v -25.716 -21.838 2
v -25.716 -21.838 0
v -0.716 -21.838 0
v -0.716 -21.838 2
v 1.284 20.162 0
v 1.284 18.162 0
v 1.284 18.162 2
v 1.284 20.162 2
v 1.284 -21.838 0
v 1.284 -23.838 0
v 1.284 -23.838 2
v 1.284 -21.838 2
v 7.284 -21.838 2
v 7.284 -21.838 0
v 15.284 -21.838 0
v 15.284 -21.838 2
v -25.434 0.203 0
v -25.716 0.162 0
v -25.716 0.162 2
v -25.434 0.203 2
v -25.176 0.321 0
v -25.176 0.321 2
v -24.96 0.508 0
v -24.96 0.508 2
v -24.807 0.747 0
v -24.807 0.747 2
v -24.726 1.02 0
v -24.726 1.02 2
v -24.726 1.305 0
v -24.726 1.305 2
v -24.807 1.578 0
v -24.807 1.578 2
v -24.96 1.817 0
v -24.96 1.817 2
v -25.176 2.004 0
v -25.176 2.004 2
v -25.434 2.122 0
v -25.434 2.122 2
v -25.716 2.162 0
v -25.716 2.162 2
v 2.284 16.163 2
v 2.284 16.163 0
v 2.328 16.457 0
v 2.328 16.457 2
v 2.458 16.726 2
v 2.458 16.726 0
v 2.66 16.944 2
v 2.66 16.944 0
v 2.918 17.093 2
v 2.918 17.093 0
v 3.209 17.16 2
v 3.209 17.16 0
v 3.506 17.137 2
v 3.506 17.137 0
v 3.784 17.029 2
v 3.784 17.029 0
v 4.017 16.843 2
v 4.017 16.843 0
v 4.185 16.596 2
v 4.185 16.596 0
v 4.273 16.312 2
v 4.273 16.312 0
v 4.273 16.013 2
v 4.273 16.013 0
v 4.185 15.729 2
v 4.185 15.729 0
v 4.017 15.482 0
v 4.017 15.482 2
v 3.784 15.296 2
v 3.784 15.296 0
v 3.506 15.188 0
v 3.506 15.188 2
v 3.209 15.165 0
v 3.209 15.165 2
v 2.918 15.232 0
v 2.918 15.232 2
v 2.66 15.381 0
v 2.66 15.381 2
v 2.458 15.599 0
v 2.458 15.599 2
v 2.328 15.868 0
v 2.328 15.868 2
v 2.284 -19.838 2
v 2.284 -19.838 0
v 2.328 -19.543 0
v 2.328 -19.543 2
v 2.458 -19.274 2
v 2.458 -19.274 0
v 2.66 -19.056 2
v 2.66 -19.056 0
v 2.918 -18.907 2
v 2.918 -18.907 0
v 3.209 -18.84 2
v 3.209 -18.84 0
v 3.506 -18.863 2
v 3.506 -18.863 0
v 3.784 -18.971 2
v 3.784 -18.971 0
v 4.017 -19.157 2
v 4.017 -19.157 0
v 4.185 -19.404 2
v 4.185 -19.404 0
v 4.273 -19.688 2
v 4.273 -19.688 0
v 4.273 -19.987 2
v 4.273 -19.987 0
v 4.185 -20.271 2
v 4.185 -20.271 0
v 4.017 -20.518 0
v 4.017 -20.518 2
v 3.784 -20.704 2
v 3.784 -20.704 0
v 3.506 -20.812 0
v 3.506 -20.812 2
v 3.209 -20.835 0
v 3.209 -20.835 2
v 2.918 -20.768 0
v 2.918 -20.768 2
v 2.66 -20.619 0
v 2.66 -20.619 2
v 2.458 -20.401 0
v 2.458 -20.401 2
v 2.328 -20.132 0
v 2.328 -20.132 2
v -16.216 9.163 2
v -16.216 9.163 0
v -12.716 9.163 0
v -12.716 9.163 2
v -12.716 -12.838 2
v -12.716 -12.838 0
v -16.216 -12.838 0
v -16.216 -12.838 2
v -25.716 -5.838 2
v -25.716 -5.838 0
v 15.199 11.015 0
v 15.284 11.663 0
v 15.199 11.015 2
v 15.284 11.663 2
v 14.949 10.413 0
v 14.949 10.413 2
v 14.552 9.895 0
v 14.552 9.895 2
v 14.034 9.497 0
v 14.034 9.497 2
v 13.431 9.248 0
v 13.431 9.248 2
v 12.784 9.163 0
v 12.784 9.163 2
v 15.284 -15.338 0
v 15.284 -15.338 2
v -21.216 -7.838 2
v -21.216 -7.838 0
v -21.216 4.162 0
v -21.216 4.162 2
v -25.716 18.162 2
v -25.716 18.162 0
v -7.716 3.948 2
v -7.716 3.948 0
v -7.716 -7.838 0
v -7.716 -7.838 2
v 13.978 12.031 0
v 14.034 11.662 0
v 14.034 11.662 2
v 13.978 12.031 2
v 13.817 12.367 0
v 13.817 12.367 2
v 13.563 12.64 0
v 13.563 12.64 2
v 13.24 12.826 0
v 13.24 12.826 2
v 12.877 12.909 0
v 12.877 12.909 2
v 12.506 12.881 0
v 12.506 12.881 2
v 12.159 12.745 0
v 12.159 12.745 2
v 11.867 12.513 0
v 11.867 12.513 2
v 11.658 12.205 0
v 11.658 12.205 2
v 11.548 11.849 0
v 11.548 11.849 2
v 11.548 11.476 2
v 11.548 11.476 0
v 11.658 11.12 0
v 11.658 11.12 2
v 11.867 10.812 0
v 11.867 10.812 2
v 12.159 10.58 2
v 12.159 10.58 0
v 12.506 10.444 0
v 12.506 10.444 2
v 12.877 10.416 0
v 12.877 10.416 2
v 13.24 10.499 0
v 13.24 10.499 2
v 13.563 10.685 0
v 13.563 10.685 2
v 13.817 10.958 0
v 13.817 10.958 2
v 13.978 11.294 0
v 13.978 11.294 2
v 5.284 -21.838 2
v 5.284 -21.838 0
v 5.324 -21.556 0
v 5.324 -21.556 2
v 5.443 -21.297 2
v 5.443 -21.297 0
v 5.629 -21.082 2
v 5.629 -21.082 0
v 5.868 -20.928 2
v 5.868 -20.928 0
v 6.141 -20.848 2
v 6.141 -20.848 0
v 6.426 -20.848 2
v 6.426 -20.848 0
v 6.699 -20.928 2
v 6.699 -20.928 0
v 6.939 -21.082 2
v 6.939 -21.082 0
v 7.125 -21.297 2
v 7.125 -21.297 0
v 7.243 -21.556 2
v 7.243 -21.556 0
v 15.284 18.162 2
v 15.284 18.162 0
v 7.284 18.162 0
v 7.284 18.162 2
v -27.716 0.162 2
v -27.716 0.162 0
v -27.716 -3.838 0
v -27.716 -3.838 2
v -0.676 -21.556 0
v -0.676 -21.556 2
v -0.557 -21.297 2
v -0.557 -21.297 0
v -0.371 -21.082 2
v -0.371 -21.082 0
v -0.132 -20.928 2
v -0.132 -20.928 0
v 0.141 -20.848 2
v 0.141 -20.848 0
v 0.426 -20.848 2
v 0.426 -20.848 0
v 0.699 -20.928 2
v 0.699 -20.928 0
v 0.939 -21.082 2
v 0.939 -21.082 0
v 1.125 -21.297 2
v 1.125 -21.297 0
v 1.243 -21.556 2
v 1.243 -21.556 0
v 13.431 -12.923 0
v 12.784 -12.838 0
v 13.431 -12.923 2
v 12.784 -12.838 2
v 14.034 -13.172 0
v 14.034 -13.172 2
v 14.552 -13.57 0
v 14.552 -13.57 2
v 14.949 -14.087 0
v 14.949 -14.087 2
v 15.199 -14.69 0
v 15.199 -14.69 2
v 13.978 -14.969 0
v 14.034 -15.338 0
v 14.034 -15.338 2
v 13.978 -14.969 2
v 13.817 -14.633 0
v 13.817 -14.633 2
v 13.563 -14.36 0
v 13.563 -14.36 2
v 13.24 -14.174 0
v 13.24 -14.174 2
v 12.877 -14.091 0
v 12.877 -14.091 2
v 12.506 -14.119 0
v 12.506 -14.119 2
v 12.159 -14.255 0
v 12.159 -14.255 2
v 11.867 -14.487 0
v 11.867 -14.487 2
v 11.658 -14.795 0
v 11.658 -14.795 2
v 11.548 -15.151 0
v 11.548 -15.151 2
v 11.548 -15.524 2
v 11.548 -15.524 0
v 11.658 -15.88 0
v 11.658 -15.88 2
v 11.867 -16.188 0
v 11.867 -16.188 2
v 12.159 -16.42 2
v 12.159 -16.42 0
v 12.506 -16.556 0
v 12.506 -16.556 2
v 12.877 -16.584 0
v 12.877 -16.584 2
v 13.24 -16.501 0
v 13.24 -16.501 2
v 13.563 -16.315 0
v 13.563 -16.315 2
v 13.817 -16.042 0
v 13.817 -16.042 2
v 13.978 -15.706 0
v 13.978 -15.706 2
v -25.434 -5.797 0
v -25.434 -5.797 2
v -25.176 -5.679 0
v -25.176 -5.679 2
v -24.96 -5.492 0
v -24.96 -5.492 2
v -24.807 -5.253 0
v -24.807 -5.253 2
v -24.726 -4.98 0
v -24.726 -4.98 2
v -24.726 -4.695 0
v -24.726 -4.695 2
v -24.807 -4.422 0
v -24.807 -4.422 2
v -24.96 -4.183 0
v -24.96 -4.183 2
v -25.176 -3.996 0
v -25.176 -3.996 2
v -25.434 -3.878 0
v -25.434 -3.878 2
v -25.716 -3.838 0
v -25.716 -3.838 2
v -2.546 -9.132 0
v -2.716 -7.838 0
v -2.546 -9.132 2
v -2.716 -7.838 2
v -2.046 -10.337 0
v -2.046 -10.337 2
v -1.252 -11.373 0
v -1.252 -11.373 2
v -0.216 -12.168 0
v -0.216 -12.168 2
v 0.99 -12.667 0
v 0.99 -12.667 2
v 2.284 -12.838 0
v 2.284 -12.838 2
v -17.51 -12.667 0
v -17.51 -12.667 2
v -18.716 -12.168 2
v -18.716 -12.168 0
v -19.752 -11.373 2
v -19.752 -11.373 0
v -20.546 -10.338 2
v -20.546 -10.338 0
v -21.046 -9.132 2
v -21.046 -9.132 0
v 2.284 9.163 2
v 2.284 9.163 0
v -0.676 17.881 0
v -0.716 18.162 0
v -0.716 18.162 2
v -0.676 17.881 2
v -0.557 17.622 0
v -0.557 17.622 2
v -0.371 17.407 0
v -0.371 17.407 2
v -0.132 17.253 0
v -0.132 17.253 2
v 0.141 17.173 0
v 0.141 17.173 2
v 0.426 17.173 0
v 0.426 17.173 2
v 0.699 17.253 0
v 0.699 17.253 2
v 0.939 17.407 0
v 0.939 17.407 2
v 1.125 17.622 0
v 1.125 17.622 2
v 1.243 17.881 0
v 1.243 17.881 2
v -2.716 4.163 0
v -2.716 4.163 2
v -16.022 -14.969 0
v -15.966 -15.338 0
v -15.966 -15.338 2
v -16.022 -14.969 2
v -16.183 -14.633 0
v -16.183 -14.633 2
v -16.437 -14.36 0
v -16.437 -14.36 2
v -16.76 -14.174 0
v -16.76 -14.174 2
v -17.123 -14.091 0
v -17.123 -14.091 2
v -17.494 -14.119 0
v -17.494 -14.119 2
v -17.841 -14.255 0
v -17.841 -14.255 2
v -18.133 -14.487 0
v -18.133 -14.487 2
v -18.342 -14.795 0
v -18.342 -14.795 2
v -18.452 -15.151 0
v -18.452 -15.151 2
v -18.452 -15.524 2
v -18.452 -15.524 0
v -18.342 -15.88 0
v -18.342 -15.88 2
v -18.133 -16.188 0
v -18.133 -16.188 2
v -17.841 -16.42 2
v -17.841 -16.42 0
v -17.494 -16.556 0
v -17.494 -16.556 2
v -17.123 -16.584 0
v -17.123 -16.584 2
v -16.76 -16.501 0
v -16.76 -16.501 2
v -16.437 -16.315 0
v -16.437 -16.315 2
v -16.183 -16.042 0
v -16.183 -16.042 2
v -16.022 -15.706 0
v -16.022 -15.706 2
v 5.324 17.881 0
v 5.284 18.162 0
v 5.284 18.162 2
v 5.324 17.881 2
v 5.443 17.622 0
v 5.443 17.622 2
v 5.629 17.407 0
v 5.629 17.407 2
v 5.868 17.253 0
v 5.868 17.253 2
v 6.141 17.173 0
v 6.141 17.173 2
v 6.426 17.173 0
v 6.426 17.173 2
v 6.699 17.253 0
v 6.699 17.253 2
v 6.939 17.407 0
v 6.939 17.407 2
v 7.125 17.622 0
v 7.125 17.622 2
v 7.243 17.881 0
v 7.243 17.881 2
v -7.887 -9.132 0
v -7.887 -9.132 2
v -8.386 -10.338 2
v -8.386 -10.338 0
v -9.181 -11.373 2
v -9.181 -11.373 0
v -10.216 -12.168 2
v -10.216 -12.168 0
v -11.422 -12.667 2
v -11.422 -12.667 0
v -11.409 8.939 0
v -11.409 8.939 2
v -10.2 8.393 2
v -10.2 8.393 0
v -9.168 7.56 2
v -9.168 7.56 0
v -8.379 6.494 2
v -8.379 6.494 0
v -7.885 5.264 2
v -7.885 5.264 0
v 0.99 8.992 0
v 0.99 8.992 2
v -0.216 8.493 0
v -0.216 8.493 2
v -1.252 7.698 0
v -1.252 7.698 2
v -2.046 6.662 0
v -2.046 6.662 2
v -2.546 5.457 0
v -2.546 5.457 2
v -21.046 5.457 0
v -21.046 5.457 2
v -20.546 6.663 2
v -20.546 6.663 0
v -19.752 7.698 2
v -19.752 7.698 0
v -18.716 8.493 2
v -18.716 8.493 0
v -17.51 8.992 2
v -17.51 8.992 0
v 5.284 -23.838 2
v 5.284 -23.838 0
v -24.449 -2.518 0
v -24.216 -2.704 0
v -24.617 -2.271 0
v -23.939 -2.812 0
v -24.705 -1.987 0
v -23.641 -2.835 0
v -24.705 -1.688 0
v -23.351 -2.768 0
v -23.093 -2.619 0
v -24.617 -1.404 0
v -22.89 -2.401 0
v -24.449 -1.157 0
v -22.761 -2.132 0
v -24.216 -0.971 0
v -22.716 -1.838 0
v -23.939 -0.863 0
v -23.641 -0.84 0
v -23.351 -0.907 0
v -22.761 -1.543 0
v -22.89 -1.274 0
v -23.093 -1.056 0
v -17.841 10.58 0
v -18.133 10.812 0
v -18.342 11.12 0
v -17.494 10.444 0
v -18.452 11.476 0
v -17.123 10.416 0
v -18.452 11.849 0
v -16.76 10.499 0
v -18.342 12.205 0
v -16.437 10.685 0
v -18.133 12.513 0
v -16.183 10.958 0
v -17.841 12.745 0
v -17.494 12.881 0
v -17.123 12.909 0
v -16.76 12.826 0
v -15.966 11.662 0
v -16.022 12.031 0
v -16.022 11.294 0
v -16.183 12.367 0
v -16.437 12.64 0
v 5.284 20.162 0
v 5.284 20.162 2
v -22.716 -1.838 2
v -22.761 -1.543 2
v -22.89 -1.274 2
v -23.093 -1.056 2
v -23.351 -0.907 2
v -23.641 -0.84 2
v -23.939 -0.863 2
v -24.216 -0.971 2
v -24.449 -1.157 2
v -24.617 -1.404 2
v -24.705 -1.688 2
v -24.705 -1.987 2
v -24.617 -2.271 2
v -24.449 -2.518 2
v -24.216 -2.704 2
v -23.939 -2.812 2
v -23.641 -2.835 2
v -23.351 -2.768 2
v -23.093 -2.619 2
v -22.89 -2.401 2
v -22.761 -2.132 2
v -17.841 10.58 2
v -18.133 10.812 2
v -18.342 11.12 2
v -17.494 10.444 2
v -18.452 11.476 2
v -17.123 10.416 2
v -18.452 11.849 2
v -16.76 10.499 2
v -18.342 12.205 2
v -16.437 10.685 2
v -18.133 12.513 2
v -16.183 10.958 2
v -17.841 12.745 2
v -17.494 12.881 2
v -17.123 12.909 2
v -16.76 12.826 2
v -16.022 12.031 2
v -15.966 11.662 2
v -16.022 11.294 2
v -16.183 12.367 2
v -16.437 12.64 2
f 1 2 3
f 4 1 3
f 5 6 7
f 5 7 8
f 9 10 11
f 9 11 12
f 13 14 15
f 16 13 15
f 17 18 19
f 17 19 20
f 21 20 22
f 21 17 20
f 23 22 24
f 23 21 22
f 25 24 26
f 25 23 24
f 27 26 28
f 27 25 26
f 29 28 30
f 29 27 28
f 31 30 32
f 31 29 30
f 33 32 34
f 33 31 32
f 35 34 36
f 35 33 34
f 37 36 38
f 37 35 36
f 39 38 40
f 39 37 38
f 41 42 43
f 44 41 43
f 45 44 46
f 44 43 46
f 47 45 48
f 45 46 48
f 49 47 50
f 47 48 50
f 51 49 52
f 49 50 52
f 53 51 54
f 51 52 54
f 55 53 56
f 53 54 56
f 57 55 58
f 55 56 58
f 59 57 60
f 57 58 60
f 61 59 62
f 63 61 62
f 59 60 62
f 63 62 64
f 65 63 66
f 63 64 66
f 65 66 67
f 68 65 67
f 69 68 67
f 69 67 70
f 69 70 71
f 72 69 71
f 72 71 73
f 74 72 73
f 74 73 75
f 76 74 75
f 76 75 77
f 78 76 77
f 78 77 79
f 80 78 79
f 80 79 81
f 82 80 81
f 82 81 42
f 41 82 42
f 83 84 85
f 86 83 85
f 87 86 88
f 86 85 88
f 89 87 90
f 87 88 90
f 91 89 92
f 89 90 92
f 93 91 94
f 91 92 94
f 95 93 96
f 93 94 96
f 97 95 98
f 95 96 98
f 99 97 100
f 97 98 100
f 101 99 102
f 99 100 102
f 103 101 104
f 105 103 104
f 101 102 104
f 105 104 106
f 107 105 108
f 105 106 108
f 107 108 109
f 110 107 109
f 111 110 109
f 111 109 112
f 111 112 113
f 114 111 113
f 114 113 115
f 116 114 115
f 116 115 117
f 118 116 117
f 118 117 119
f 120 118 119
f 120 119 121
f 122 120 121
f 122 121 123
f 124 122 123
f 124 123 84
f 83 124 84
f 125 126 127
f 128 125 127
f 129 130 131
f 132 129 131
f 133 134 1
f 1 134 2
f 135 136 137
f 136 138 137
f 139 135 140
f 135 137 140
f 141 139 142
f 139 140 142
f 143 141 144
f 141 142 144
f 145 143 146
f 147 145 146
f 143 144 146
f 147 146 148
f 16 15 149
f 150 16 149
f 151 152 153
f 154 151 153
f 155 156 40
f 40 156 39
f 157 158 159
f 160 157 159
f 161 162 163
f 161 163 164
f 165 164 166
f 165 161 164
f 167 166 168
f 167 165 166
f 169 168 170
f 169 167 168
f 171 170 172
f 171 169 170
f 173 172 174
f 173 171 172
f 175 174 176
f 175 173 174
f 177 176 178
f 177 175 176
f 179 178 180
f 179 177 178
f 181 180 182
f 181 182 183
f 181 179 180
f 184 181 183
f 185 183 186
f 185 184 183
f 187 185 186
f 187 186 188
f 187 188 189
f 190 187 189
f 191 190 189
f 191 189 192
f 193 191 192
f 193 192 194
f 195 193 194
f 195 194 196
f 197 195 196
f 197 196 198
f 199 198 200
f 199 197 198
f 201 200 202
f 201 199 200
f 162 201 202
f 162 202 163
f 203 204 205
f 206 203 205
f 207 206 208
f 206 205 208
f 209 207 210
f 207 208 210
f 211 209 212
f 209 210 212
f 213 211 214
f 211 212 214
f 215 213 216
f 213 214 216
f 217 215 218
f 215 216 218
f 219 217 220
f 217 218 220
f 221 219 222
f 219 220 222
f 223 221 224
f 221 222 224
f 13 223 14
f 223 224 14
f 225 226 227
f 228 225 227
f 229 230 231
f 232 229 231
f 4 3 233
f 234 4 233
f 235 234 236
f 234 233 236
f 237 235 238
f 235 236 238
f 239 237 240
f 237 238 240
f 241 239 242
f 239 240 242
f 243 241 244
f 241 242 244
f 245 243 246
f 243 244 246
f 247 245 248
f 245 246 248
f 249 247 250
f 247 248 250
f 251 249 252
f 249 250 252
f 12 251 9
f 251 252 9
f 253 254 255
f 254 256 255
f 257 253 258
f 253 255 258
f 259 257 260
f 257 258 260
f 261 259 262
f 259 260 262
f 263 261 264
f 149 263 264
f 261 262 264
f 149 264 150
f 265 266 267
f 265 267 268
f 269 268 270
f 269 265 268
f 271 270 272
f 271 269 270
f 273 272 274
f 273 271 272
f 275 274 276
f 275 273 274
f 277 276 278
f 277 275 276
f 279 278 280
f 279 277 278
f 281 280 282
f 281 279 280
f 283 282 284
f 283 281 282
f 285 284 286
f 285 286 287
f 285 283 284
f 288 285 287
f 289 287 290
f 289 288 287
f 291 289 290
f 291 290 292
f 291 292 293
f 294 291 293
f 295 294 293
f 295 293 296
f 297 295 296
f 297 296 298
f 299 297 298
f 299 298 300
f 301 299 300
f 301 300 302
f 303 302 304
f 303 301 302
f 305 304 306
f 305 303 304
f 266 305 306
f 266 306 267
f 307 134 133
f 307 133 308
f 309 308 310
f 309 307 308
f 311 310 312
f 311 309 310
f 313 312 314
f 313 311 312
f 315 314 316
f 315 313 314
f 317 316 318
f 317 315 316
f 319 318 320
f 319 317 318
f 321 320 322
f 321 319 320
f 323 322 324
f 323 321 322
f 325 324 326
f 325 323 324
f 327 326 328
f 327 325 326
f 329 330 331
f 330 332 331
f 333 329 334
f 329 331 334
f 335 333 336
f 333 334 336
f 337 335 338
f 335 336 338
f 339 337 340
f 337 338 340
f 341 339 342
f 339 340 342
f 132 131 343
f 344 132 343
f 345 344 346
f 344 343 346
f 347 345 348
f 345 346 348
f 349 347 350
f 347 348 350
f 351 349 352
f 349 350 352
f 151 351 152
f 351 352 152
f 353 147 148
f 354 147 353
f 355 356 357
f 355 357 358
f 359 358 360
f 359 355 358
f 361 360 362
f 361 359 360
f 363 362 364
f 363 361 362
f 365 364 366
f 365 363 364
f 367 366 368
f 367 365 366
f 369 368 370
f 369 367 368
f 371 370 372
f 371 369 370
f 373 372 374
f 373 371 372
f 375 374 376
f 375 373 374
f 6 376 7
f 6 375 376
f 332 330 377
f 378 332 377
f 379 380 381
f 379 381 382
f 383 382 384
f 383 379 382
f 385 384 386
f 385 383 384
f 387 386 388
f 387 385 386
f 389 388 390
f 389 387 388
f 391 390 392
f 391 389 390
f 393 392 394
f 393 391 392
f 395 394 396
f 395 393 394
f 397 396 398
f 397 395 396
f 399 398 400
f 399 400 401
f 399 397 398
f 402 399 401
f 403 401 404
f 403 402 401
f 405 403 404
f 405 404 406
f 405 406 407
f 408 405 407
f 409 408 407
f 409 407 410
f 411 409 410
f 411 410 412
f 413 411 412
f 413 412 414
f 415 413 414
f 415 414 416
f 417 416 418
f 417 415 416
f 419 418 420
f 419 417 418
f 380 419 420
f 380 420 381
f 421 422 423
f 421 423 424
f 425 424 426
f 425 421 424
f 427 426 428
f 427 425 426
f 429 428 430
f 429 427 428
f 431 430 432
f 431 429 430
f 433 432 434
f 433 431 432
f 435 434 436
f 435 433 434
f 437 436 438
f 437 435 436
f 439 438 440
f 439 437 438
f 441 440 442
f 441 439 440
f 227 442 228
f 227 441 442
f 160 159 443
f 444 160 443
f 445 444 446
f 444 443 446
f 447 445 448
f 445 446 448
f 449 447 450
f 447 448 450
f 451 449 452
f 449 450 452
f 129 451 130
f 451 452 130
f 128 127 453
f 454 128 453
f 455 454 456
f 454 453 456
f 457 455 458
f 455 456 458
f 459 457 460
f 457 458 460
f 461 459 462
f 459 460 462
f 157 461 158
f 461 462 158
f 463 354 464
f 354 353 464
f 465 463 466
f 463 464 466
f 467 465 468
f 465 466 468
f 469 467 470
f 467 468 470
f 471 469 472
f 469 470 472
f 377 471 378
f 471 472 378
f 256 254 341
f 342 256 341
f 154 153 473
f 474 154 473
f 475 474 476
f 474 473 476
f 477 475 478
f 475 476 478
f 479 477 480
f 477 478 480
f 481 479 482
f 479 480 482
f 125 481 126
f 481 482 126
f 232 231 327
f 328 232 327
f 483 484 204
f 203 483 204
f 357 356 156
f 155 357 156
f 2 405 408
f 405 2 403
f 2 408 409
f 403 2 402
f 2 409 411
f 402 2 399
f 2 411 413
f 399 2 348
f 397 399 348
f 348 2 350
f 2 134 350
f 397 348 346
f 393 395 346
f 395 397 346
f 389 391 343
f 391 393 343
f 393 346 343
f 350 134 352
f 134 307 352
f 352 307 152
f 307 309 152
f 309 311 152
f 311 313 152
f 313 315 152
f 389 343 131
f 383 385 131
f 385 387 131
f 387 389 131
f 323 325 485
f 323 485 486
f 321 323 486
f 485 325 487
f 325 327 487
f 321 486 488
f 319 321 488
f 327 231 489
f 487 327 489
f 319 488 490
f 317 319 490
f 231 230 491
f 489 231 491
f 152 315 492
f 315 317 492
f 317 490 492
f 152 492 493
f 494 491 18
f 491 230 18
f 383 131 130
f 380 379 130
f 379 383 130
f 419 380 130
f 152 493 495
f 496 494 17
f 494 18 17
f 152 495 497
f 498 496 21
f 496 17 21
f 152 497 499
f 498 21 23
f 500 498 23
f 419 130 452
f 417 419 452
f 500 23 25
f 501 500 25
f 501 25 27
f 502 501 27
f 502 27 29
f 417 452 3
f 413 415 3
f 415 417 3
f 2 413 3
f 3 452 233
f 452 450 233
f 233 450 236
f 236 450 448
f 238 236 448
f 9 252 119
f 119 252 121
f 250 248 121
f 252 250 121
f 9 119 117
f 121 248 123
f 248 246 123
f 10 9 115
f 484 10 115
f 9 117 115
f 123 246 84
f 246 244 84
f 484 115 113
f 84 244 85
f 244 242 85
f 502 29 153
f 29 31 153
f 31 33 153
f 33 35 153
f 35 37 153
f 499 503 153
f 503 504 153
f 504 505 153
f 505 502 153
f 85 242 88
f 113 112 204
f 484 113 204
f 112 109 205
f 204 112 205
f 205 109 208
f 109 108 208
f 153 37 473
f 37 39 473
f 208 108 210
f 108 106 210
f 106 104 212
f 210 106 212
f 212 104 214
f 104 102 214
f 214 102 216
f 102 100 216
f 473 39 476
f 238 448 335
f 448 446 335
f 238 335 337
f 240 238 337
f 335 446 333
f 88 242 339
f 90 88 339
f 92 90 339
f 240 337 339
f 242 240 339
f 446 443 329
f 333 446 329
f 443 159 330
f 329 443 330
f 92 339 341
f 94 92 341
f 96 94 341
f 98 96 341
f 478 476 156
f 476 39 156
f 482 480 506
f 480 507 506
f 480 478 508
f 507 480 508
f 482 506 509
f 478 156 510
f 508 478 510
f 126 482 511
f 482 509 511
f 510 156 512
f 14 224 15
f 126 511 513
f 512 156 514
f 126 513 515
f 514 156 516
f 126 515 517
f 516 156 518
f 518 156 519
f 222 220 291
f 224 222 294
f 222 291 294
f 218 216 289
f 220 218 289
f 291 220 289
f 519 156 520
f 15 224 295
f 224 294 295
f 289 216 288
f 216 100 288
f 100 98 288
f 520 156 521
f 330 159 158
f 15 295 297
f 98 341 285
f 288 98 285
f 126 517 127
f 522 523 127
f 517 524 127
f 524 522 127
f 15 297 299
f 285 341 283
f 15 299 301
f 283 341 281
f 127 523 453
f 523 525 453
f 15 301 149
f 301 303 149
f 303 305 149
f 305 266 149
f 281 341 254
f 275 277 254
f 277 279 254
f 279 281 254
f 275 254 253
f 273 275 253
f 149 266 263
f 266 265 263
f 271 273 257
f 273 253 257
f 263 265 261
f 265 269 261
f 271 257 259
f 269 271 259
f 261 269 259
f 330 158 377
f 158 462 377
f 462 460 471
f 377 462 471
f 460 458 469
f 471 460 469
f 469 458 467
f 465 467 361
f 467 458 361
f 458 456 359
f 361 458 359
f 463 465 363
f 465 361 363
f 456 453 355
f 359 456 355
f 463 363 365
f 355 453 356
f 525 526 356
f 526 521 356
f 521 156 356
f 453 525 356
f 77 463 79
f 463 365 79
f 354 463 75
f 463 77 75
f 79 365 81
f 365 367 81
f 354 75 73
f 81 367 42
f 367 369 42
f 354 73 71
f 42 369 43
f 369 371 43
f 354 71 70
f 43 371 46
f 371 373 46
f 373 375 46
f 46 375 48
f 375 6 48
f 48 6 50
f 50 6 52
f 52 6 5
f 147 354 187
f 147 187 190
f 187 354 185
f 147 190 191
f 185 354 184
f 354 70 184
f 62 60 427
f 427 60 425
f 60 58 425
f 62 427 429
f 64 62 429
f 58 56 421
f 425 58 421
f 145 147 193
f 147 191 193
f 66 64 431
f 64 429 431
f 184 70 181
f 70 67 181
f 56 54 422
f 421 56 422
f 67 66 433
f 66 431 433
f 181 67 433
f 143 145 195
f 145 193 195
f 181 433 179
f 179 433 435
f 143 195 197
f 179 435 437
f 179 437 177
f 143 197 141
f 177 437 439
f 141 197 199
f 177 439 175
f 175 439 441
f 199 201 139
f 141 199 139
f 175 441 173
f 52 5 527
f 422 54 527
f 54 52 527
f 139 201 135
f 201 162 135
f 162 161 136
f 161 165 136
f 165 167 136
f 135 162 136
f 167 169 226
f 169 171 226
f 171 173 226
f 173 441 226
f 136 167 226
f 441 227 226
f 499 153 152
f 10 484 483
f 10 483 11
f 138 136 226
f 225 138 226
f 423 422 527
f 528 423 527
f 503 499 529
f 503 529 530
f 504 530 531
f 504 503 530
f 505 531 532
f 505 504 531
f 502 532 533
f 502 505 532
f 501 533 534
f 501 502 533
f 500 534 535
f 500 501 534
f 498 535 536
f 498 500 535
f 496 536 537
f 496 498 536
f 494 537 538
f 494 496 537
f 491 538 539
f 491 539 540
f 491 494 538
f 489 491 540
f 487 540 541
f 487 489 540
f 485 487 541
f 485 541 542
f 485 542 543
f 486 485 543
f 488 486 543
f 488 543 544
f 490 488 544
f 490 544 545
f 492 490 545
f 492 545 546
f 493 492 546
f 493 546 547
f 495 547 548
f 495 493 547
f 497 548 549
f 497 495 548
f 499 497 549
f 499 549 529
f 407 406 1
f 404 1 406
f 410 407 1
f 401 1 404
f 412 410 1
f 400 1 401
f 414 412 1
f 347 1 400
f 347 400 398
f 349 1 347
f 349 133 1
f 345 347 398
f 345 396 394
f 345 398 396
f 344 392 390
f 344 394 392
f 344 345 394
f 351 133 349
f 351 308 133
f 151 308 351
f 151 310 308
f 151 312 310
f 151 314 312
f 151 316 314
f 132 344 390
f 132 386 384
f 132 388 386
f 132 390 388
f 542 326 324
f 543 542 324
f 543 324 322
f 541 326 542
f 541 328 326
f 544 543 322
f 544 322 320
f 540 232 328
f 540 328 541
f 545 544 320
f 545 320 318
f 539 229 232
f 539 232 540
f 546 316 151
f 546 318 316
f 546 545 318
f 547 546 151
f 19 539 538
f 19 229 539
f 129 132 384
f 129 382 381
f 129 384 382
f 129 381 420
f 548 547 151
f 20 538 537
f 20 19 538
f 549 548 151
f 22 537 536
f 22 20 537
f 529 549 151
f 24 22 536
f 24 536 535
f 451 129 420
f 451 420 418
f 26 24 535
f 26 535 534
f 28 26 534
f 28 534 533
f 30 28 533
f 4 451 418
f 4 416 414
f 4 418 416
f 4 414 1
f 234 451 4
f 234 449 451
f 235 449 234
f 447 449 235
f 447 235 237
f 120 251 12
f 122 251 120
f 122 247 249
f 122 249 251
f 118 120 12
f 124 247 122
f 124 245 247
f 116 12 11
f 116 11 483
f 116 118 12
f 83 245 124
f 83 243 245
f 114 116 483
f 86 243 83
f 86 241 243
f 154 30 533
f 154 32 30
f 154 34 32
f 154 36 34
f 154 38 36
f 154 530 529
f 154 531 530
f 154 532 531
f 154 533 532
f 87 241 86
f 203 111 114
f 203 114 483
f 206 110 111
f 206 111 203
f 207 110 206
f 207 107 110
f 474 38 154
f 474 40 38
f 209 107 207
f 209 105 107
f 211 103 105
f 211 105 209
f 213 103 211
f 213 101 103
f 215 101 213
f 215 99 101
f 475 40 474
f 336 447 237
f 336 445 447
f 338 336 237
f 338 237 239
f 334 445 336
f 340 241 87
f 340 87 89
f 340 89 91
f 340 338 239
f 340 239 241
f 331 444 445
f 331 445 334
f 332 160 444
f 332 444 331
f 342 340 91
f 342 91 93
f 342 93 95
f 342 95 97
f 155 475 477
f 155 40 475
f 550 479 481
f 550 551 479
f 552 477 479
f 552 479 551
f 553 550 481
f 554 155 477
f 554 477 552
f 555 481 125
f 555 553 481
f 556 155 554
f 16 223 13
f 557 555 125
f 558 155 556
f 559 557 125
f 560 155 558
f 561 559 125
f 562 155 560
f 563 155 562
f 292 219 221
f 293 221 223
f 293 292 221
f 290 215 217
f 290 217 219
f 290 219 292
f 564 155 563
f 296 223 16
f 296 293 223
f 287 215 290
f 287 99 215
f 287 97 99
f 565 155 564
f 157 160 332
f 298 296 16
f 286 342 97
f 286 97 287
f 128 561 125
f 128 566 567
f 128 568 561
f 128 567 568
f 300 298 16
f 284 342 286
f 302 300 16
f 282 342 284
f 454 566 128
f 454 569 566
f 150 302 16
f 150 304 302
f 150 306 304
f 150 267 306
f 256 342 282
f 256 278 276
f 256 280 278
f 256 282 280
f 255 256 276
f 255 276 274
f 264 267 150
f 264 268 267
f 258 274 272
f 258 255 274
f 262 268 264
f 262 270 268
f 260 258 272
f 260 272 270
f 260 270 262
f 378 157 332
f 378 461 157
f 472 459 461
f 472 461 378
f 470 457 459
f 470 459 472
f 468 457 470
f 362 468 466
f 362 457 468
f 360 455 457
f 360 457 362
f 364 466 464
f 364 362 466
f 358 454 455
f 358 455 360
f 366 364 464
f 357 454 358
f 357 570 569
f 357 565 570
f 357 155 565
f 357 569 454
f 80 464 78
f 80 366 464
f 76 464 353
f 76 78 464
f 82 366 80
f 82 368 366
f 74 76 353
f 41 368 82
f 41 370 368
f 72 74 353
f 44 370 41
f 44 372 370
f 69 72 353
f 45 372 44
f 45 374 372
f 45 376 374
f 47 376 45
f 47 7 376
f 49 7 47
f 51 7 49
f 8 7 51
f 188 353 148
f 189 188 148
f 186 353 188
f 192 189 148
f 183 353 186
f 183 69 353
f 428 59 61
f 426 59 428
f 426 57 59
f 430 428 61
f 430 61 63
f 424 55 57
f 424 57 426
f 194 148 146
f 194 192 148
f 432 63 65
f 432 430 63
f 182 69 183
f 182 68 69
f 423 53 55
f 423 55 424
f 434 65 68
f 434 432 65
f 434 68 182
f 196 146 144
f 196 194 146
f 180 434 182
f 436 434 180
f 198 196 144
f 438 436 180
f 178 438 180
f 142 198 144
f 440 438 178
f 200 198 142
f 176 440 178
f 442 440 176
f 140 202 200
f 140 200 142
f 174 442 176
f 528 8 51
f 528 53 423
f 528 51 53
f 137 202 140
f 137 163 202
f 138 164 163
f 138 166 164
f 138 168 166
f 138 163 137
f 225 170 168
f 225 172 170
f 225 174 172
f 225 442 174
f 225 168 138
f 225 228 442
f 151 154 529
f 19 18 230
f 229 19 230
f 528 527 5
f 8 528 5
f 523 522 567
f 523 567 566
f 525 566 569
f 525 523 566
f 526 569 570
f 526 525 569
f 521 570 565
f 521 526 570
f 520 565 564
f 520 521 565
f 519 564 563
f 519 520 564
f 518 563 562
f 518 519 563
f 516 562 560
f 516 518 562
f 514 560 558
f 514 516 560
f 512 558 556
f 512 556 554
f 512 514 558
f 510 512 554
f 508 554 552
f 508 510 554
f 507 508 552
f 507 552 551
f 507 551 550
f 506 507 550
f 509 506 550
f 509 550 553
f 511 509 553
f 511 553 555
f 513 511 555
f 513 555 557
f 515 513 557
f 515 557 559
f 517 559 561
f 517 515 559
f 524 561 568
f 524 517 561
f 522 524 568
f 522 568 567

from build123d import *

# Parameters (mm, degrees)
SKETCH_1_R          = 1.25
SKETCH_1_R_2        = 1
EXTRUDE_1_DEPTH     = 2
SKETCH_4_W          = 18
SKETCH_4_H          = 22
CUT_EXTRUDE_1_DEPTH = 2
FILLET_2_R          = 2.5
FILLET_3_R          = 5
CUT_EXTRUDE_2_DEPTH = 2
SKETCH_7_R          = 1
CUT_EXTRUDE_3_DEPTH = 10
SKETCH_8_W          = 4
SKETCH_8_H          = 2
EXTRUDE_2_DEPTH     = 2
CUT_EXTRUDE_4_DEPTH = 2


with BuildPart() as part:
    # 草圖1 → 填料-伸長1 (new body)
    with BuildSketch(Plane.XY):
        Polygon((15.283786802, 18.1625), (-25.716213198, 18.1625), (-25.716213198, 0.1625), (-27.716213198, 0.1625), (-27.716213198, -3.8375), (-25.716213198, -3.8375), (-25.716213198, -21.8375), (15.283786802, -21.8375), align=None)
        with Locations((-17.216213198, 11.6625)):
            Circle(SKETCH_1_R, mode=Mode.SUBTRACT)
        with Locations((-17.216213198, -15.3375)):
            Circle(SKETCH_1_R, mode=Mode.SUBTRACT)
        with Locations((12.783786802, -15.3375)):
            Circle(SKETCH_1_R, mode=Mode.SUBTRACT)
        with Locations((12.783786802, 11.6625)):
            Circle(SKETCH_1_R, mode=Mode.SUBTRACT)
        with Locations((-23.716213198, -1.8375)):
            Circle(SKETCH_1_R_2, mode=Mode.SUBTRACT)
    extrude(amount=EXTRUDE_1_DEPTH)

    # 草圖4 → 除料-伸長1 (cut)
    with BuildSketch(Plane(origin=(0, 0, 0), x_dir=(-1, 0, 0), z_dir=(0, 0, -1))):
        with Locations((-6.283786802, -1.8375)):
            Rectangle(SKETCH_4_W, SKETCH_4_H)
    extrude(amount=-CUT_EXTRUDE_1_DEPTH, mode=Mode.SUBTRACT)

    # 圓角2
    fillet_2_edges = [part.edges().sort_by_distance(p)[0] for p in [
        (15.283786802, -12.8375, 1),
        (15.283786802, 9.1625, 1),
    ]]
    fillet(fillet_2_edges, radius=FILLET_2_R)

    # 圓角3
    fillet_3_edges = [part.edges().sort_by_distance(p)[0] for p in [
        (-2.716213198, 9.1625, 1),
        (-2.716213198, -12.8375, 1),
    ]]
    fillet(fillet_3_edges, radius=FILLET_3_R)

    # 草圖5 → 除料-伸長2 (cut)
    with BuildSketch(Plane(origin=(0, 0, 0), x_dir=(-1, 0, 0), z_dir=(0, 0, -1))):
        with BuildLine():
            Line((7.716213198, 3.948031945), (7.716213198, -7.8375))
            ThreePointArc((7.716213198, -7.8375), (9.180679292, -11.373033906), (12.716213198, -12.8375))
            Line((12.716213198, -12.8375), (16.216213198, -12.8375))
            ThreePointArc((16.216213198, -12.8375), (19.751747104, -11.373033906), (21.216213198, -7.8375))
            Line((21.216213198, -7.8375), (21.216213198, 4.1625))
            ThreePointArc((21.216213198, 4.1625), (19.751747104, 7.698033906), (16.216213198, 9.1625))
            Line((16.216213198, 9.1625), (12.716213198, 9.1625))
            ThreePointArc((12.716213198, 9.1625), (9.168164983, 7.56020857), (7.716213198, 3.948031945))
        make_face()
    extrude(amount=-CUT_EXTRUDE_2_DEPTH, mode=Mode.SUBTRACT)

    # 草圖7 → 除料-伸長3 (cut)
    with BuildSketch(Plane(origin=(0, 0, 0), x_dir=(-1, 0, 0), z_dir=(0, 0, -1))):
        with Locations((-3.283786802, -19.8375)):
            Circle(SKETCH_7_R)
        with Locations((-3.283786802, 16.1625)):
            Circle(SKETCH_7_R)
    extrude(amount=-CUT_EXTRUDE_3_DEPTH, mode=Mode.SUBTRACT)

    # 草圖8 → 填料-伸長2 (add)
    with BuildSketch(Plane(origin=(0, 0, 0), x_dir=(-1, 0, 0), z_dir=(0, 0, -1))):
        with Locations((-3.283786802, 19.1625)):
            Rectangle(SKETCH_8_W, SKETCH_8_H)
        with Locations((-3.283786802, -22.8375)):
            Rectangle(SKETCH_8_W, SKETCH_8_H)
    extrude(amount=-EXTRUDE_2_DEPTH)

    # 草圖9 → 除料-伸長4 (cut)
    with BuildSketch(Plane(origin=(0, 0, 0), x_dir=(-1, 0, 0), z_dir=(0, 0, -1))):
        with BuildLine():
            Line((-7.283786802, 18.1625), (-5.283786802, 18.1625))
            ThreePointArc((-5.283786802, 18.1625), (-6.283786802, 17.1625), (-7.283786802, 18.1625))
        make_face()
        with BuildLine():
            Line((-1.283786802, 18.1625), (0.716213198, 18.1625))
            ThreePointArc((0.716213198, 18.1625), (-0.283786802, 17.1625), (-1.283786802, 18.1625))
        make_face()
        with BuildLine():
            Line((-7.283786802, -21.8375), (-5.283786802, -21.8375))
            ThreePointArc((-5.283786802, -21.8375), (-6.283786802, -20.8375), (-7.283786802, -21.8375))
        make_face()
        with BuildLine():
            Line((-1.283786802, -21.8375), (0.716213198, -21.8375))
            ThreePointArc((0.716213198, -21.8375), (-0.283786802, -20.8375), (-1.283786802, -21.8375))
        make_face()
        with BuildLine():
            Line((25.716213198, 2.1625), (25.716213198, 0.1625))
            ThreePointArc((25.716213198, 0.1625), (24.716213198, 1.1625), (25.716213198, 2.1625))
        make_face()
        with BuildLine():
            Line((25.716213198, -3.8375), (25.716213198, -5.8375))
            ThreePointArc((25.716213198, -5.8375), (24.716213198, -4.8375), (25.716213198, -3.8375))
        make_face()
    extrude(amount=-CUT_EXTRUDE_4_DEPTH, mode=Mode.SUBTRACT)


solid = part.part
